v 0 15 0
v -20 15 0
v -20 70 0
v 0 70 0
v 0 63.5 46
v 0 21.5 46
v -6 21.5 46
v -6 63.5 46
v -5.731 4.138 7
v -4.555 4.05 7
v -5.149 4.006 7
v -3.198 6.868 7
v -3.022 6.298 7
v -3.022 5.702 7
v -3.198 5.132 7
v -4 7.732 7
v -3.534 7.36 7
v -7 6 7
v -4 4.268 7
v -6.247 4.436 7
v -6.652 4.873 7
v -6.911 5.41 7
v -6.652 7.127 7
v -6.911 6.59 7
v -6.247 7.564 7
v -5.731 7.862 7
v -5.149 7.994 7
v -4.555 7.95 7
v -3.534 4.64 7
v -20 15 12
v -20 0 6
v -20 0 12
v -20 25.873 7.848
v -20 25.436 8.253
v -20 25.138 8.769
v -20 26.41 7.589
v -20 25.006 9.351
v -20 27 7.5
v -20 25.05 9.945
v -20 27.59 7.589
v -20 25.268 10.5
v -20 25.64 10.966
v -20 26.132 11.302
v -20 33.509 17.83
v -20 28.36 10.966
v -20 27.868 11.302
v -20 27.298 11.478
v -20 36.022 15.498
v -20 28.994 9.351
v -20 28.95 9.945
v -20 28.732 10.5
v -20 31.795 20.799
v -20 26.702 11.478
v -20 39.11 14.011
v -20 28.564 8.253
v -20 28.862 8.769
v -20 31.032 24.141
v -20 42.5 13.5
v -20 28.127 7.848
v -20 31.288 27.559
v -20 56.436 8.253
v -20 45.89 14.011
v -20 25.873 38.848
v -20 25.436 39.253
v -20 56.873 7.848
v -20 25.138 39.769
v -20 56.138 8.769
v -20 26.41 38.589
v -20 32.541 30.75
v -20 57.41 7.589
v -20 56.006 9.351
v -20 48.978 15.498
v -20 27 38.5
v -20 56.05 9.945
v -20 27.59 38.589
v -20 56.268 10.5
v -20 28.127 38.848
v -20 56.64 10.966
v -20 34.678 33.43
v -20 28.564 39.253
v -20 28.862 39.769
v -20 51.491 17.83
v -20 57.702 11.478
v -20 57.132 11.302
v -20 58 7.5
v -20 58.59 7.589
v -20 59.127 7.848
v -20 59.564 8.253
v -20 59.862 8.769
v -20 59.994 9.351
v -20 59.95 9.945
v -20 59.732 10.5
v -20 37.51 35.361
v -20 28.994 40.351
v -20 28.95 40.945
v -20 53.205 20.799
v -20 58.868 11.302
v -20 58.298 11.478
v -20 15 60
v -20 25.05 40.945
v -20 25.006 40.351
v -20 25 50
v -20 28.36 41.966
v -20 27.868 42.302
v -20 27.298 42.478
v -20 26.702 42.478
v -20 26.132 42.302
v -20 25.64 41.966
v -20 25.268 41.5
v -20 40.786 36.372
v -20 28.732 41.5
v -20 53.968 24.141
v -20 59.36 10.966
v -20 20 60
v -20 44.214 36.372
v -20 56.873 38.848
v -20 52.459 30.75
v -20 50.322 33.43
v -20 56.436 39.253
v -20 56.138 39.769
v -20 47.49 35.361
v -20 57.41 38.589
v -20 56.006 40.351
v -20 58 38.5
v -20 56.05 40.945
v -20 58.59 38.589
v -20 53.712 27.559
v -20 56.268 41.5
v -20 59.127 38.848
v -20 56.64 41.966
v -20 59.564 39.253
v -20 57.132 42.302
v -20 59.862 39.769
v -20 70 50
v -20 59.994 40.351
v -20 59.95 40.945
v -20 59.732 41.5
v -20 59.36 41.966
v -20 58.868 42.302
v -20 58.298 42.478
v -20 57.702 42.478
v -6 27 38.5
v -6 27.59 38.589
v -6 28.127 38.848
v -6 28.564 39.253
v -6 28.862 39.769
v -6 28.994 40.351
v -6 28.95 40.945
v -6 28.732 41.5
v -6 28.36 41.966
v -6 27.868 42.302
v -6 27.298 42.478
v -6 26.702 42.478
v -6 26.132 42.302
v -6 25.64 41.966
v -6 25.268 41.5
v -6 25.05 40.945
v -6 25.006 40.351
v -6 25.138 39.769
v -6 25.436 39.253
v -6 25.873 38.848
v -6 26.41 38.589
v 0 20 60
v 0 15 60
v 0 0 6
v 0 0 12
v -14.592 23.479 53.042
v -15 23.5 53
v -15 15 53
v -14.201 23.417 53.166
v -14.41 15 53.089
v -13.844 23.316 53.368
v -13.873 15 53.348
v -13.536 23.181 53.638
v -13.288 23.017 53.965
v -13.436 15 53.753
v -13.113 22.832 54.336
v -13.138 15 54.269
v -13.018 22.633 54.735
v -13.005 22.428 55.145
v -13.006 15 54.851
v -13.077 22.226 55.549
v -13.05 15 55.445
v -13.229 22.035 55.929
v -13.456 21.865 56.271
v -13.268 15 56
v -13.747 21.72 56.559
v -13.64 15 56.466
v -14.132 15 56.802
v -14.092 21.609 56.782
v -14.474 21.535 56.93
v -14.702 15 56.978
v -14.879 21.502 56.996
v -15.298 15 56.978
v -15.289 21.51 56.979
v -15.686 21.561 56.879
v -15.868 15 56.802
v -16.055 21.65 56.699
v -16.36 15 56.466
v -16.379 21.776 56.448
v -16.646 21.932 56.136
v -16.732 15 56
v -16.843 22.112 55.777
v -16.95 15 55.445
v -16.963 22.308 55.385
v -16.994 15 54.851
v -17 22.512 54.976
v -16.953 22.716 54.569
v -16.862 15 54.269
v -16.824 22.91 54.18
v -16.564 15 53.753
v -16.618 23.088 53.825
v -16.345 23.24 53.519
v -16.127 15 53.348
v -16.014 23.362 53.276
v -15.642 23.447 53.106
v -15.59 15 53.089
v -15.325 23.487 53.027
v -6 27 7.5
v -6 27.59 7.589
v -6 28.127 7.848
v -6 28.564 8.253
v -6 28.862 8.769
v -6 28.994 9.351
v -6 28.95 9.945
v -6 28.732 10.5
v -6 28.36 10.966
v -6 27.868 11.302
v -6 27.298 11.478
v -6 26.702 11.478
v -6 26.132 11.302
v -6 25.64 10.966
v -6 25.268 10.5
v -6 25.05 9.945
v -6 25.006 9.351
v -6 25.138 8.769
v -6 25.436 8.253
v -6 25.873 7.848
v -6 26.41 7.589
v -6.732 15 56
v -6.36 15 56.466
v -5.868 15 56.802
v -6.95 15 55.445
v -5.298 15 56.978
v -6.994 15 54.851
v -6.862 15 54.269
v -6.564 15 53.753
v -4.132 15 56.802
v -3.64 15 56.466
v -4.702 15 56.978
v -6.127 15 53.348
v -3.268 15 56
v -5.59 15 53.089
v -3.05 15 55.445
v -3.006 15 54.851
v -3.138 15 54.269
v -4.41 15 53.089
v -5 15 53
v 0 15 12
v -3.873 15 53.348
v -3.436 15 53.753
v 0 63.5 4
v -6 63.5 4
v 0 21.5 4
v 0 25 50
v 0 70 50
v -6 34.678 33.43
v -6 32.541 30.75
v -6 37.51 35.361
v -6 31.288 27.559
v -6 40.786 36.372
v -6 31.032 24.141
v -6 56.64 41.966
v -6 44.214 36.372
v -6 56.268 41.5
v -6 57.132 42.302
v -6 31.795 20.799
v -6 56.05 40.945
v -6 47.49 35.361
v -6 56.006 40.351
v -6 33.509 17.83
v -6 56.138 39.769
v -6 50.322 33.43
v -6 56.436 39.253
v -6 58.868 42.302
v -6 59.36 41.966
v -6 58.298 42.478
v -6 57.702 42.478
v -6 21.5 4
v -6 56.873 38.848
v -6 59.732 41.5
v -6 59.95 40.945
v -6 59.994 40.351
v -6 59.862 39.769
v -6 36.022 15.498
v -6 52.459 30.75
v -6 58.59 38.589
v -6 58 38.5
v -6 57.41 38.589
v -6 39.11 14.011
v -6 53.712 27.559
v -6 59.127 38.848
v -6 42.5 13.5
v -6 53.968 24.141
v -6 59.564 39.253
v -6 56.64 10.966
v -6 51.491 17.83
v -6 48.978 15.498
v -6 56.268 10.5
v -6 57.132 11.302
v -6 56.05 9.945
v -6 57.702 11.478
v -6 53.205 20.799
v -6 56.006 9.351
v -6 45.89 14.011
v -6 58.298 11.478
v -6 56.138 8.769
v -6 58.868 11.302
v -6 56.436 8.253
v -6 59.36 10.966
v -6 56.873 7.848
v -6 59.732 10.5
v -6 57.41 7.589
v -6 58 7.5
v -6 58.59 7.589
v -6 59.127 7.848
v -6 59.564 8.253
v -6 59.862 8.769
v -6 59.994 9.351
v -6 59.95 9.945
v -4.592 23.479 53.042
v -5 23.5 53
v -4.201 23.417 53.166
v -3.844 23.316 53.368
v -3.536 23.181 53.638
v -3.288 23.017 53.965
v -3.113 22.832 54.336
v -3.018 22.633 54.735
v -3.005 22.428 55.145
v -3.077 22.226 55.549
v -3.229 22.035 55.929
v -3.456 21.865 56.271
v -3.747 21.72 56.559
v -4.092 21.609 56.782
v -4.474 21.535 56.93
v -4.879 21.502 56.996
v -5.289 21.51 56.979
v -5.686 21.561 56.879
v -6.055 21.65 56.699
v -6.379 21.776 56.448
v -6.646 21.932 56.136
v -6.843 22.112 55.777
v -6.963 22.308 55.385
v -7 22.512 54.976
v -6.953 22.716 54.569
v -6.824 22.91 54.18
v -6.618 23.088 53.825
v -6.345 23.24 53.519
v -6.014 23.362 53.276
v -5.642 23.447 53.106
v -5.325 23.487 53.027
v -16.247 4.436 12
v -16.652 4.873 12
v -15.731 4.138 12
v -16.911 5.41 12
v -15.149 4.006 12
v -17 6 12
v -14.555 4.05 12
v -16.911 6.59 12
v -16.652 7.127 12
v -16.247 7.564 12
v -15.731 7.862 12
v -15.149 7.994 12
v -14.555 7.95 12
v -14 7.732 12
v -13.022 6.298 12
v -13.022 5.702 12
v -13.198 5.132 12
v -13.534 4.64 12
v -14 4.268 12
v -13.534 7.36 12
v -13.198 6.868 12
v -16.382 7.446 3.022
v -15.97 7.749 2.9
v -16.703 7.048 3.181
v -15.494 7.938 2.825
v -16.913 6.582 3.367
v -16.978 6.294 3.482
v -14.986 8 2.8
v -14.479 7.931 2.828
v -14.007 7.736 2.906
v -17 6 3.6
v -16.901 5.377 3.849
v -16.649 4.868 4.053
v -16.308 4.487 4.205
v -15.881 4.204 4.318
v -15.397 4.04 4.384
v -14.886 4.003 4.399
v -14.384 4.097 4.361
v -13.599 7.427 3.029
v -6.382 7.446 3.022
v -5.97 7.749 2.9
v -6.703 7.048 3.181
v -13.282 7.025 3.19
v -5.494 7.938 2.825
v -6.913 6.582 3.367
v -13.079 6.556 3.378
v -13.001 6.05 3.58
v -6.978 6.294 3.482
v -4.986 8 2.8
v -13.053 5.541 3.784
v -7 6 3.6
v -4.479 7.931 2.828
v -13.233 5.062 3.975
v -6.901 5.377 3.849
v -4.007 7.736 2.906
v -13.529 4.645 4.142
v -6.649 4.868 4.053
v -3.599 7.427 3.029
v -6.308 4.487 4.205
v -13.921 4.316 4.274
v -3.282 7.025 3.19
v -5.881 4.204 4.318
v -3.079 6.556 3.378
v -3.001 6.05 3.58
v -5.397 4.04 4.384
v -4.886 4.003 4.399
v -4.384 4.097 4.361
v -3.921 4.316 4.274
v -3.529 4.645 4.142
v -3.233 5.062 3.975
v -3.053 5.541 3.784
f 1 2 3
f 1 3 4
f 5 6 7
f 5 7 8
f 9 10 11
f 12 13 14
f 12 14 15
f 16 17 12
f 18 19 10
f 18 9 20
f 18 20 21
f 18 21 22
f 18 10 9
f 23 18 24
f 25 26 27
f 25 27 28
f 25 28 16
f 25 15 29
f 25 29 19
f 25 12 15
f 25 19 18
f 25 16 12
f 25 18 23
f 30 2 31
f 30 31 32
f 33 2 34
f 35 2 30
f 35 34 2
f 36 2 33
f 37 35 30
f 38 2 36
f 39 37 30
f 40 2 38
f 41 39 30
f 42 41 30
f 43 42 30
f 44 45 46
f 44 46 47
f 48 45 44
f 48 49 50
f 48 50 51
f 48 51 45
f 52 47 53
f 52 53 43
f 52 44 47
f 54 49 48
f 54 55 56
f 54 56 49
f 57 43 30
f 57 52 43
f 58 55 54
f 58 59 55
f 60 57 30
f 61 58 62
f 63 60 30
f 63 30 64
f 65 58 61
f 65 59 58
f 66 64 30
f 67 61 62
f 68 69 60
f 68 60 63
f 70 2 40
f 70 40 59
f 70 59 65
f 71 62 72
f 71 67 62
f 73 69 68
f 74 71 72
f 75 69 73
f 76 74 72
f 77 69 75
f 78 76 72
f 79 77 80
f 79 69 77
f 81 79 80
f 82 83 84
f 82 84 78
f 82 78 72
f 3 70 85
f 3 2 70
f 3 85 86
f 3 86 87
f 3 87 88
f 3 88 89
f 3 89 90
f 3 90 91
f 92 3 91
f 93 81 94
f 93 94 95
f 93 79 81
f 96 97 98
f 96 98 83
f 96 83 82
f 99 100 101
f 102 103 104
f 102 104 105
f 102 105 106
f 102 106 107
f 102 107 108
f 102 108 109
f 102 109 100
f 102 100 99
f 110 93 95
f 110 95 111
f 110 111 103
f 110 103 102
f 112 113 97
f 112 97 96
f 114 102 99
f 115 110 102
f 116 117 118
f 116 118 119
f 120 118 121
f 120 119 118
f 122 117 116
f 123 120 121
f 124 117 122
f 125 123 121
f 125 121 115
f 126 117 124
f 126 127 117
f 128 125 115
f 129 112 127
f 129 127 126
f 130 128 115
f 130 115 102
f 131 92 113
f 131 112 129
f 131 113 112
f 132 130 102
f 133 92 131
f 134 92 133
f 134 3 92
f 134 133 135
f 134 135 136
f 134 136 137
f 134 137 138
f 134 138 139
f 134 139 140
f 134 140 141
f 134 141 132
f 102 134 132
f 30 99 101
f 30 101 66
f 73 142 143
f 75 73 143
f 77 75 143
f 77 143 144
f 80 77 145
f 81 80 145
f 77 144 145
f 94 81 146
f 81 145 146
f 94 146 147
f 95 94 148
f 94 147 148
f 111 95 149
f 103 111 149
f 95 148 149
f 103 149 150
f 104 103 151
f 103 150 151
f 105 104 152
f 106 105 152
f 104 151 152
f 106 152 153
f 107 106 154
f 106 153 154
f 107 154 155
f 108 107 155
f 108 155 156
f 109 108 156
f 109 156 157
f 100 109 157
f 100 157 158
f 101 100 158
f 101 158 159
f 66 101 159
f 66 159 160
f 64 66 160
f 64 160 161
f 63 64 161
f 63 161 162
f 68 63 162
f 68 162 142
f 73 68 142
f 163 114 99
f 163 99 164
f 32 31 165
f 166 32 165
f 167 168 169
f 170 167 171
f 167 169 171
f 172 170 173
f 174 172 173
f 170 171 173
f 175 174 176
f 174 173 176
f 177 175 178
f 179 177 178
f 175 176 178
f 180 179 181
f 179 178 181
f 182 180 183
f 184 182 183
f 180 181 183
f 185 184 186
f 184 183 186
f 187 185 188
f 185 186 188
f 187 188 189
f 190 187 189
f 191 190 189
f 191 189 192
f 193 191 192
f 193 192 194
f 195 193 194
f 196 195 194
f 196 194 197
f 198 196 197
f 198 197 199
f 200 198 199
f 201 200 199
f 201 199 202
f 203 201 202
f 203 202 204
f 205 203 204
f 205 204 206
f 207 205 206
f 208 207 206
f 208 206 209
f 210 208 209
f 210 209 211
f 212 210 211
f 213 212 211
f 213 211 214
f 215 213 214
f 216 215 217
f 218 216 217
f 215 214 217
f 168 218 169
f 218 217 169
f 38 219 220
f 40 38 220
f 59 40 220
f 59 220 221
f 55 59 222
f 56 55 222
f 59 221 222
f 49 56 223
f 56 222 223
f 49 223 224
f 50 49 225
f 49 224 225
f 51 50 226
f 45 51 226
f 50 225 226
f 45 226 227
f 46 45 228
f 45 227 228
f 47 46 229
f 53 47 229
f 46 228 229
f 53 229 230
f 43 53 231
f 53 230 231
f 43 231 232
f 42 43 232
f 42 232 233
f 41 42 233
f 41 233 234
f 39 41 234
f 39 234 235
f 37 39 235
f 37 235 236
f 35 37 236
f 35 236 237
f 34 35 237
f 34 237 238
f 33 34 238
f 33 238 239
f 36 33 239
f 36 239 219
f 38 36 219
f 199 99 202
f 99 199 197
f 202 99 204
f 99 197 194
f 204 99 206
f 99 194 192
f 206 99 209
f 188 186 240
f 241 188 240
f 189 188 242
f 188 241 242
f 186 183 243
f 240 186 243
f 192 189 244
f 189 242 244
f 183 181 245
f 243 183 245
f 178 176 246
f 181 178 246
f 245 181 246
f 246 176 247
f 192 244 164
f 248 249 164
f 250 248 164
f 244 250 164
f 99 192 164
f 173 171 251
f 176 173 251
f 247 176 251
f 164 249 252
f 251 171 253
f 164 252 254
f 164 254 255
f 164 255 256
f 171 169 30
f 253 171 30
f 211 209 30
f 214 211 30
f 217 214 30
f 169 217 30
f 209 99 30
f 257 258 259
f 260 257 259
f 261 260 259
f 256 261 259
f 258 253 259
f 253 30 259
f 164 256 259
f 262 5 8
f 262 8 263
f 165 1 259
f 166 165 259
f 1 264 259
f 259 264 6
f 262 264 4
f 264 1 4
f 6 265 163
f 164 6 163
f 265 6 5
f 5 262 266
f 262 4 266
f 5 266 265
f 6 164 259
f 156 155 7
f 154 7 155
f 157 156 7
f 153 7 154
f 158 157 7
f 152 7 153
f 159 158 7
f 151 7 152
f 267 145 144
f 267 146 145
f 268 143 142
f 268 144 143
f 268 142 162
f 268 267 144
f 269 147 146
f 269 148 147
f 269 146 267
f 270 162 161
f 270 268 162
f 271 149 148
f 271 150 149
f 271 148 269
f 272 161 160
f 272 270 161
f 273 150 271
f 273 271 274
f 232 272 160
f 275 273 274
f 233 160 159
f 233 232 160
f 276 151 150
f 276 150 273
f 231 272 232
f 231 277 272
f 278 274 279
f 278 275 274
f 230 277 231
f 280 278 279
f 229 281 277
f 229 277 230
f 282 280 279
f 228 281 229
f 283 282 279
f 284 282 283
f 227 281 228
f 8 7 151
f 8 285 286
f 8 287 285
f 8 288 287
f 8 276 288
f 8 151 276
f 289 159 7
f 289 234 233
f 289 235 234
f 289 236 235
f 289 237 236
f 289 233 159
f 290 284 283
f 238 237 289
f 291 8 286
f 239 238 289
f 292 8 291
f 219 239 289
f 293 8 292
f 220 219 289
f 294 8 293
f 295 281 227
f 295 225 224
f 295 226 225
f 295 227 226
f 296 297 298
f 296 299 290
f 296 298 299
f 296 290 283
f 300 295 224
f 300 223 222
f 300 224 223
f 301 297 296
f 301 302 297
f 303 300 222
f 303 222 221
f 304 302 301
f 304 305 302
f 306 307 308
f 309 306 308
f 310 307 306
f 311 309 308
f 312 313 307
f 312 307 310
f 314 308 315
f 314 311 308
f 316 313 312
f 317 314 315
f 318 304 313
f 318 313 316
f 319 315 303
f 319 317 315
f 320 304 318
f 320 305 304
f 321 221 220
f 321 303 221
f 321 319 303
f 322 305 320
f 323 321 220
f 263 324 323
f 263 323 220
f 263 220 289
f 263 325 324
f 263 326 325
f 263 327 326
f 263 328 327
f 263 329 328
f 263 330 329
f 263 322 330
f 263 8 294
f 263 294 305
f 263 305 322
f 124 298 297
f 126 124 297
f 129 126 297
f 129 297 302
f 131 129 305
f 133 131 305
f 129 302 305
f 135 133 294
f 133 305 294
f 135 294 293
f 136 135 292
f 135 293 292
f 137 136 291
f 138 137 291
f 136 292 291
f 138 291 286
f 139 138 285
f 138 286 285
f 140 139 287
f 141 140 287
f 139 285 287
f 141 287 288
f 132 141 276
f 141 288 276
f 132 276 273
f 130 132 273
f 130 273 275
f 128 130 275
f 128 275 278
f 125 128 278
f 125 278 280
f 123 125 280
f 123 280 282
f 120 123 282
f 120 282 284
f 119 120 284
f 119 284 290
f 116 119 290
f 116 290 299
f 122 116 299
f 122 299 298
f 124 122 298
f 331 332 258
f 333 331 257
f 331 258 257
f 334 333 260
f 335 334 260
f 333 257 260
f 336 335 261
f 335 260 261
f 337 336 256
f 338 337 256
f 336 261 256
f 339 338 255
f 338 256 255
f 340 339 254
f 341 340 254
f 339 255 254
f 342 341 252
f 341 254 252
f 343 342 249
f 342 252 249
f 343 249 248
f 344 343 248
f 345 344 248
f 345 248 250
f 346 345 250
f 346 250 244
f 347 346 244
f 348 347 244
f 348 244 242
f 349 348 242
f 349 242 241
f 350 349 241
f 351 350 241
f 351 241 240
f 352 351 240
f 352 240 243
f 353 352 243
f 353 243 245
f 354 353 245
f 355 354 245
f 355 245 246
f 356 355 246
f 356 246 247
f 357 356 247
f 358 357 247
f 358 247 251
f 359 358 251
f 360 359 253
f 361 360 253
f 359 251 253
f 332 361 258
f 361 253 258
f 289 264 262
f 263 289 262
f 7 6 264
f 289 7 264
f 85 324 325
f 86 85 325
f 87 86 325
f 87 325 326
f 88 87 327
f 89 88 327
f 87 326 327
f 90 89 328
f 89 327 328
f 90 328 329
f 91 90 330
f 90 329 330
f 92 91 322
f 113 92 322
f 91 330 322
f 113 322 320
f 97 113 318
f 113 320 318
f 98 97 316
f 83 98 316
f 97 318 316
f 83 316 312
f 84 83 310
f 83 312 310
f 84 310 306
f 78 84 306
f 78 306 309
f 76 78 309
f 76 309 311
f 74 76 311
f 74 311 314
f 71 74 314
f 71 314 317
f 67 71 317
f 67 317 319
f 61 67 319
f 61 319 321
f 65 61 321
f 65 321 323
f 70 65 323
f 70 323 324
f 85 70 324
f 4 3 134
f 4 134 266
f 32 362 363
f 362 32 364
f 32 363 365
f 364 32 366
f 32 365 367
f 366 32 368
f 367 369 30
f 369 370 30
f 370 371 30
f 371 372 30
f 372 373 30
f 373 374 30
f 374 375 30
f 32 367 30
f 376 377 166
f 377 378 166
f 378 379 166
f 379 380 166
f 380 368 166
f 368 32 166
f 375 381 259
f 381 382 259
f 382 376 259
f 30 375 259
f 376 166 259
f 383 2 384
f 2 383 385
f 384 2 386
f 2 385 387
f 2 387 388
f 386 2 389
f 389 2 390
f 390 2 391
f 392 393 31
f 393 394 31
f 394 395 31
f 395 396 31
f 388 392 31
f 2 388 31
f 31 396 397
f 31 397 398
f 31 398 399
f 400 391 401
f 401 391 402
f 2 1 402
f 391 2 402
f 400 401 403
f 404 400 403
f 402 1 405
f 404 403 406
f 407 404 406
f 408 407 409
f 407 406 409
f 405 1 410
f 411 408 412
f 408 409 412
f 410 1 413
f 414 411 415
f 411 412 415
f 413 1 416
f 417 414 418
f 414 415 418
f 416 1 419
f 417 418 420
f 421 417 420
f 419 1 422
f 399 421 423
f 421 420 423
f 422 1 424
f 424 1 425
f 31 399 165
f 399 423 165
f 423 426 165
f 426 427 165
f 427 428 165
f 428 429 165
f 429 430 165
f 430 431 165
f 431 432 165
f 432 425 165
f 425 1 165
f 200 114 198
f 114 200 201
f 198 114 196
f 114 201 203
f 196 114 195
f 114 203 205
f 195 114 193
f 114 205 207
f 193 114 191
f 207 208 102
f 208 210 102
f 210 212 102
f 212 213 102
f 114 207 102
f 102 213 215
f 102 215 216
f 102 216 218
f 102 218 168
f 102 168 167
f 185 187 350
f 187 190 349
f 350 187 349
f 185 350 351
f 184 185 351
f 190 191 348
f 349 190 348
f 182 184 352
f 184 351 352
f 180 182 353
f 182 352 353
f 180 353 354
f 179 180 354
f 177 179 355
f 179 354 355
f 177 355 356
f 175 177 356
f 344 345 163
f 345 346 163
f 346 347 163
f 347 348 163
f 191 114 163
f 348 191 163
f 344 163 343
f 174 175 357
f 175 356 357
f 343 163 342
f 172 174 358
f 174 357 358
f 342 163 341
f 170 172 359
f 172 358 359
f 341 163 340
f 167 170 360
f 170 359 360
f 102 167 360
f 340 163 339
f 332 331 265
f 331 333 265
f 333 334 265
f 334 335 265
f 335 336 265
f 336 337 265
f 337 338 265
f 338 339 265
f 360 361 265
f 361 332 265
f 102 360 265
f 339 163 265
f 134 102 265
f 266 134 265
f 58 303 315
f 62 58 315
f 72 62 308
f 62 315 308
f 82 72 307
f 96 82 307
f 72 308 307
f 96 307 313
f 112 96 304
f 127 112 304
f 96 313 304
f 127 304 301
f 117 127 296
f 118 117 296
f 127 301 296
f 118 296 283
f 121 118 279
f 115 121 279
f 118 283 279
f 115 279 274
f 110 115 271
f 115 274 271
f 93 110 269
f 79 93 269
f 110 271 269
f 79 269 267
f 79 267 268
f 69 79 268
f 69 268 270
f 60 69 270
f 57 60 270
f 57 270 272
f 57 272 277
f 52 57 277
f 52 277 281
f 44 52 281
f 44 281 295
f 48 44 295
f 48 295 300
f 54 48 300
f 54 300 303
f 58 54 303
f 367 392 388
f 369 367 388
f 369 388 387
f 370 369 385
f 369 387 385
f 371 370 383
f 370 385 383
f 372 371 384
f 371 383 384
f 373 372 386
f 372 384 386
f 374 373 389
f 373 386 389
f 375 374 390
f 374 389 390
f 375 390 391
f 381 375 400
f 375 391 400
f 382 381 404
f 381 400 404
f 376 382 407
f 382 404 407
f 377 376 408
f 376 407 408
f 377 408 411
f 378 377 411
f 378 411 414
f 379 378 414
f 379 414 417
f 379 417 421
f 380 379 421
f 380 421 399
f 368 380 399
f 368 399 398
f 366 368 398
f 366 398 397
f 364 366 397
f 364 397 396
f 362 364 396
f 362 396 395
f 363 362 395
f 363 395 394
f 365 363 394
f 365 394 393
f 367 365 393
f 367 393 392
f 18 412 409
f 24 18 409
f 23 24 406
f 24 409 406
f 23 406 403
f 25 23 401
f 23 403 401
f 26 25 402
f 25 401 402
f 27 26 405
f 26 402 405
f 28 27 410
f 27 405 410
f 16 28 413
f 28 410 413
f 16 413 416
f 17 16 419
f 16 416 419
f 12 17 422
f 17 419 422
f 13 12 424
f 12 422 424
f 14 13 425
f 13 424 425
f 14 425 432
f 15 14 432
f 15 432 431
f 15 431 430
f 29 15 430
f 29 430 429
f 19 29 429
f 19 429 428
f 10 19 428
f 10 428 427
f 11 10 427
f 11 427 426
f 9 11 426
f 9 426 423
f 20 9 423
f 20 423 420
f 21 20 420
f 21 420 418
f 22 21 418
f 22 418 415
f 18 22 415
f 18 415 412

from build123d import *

# Parameters (mm, degrees)
SKETCH1_W           = 20
SKETCH1_H           = 50
BOSS_EXTRUDE1_DEPTH = 70
SKETCH2_R           = 2
SKETCH2_R_2         = 11.5
CUT_EXTRUDE2_DEPTH  = 60
SKETCH4_W           = 38
SKETCH4_H           = 15
CUT_EXTRUDE3_DEPTH  = 60
SKETCH8_R           = 2
CUT_EXTRUDE5_DEPTH  = 15
SKETCH9_W           = 42
SKETCH9_H           = 42
CUT_EXTRUDE6_DEPTH  = 6
SKETCH10_R          = 2
CUT_EXTRUDE7_DEPTH  = 7
CUT_EXTRUDE8_DEPTH  = 30
SKETCH12_W          = 20
SKETCH12_H          = 5
BOSS_EXTRUDE2_DEPTH = 10
BOSS_EXTRUDE3_DEPTH = 20
SKETCH15_R          = 2
CUT_EXTRUDE9_DEPTH  = 10


with BuildPart() as part:
    # Sketch1 → Boss-Extrude1 (new body)
    with BuildSketch(Plane(origin=(0, 0, 0), x_dir=(1, 0, 0), z_dir=(0, 1, 0))):
        with Locations((-10, -25)):
            Rectangle(SKETCH1_W, SKETCH1_H)
    extrude(amount=BOSS_EXTRUDE1_DEPTH)

    # Sketch2 → Cut-Extrude2 (cut)
    with BuildSketch(Plane(origin=(0, 0, 0), x_dir=(0, 0, -1), z_dir=(1, 0, 0))):
        with Locations((-9.5, 58)):
            Circle(SKETCH2_R)
        with Locations((-25, 42.5)):
            Circle(SKETCH2_R_2)
        with Locations((-9.5, 27)):
            Circle(SKETCH2_R)
        with Locations((-40.5, 27)):
            Circle(SKETCH2_R)
        with Locations((-40.5, 58)):
            Circle(SKETCH2_R)
    extrude(amount=-CUT_EXTRUDE2_DEPTH, mode=Mode.SUBTRACT)

    # Sketch4 → Cut-Extrude3 (cut)
    with BuildSketch(Plane(origin=(0, 0, 0), x_dir=(0, 0, -1), z_dir=(1, 0, 0))):
        with Locations((-31, 7.5)):
            Rectangle(SKETCH4_W, SKETCH4_H)
    extrude(amount=-CUT_EXTRUDE3_DEPTH, mode=Mode.SUBTRACT)

    # Sketch8 → Cut-Extrude5 (cut)
    with BuildSketch(Plane(origin=(0, 0, 0), x_dir=(-1, 0, 0), z_dir=(0, 0, -1))):
        with Locations((15, 6)):
            Circle(SKETCH8_R)
    extrude(amount=-CUT_EXTRUDE5_DEPTH, mode=Mode.SUBTRACT)

    # Sketch9 → Cut-Extrude6 (cut)
    with BuildSketch(Plane(origin=(0, 0, 0), x_dir=(0, 0, -1), z_dir=(1, 0, 0))):
        with Locations((-25, 42.5)):
            Rectangle(SKETCH9_W, SKETCH9_H)
    extrude(amount=-CUT_EXTRUDE6_DEPTH, mode=Mode.SUBTRACT)

    # Sketch10 → Cut-Extrude7 (cut)
    with BuildSketch(Plane(origin=(0, 0, 0), x_dir=(-1, 0, 0), z_dir=(0, 0, -1))):
        with Locations((5, 6)):
            Circle(SKETCH10_R)
    extrude(amount=-CUT_EXTRUDE7_DEPTH, mode=Mode.SUBTRACT)

    # Sketch11 → Cut-Extrude8 (cut)
    with BuildSketch(Plane(origin=(0, 0, 0), x_dir=(0, 0, -1), z_dir=(1, 0, 0))):
        Polygon((-6, 0), (0, 0), (0, 15), align=None)
    extrude(amount=-CUT_EXTRUDE8_DEPTH, mode=Mode.SUBTRACT)

    # Sketch12 → Boss-Extrude2 (add)
    with BuildSketch(Plane.XY.offset(50)):
        with Locations((-10, 17.5)):
            Rectangle(SKETCH12_W, SKETCH12_H)
    extrude(amount=BOSS_EXTRUDE2_DEPTH)

    # Sketch14 → Boss-Extrude3 (add)
    with BuildSketch(Plane(origin=(0, 0, 0), x_dir=(0, 0, -1), z_dir=(1, 0, 0))):
        Polygon((-50, 20), (-60, 20), (-50, 25), align=None)
    extrude(amount=-BOSS_EXTRUDE3_DEPTH)

    # Sketch15 → Cut-Extrude9 (cut)
    with BuildSketch(Plane(origin=(0, 15, 0), x_dir=(-1, 0, 0), z_dir=(0, -1, 0))):
        with Locations(Location((5, -55, 0), (0, 0, 90))):
            Circle(SKETCH15_R)
        with Locations(Location((15, -55, 0), (0, 0, 90))):
            Circle(SKETCH15_R)
    extrude(amount=-CUT_EXTRUDE9_DEPTH, mode=Mode.SUBTRACT)


solid = part.part
